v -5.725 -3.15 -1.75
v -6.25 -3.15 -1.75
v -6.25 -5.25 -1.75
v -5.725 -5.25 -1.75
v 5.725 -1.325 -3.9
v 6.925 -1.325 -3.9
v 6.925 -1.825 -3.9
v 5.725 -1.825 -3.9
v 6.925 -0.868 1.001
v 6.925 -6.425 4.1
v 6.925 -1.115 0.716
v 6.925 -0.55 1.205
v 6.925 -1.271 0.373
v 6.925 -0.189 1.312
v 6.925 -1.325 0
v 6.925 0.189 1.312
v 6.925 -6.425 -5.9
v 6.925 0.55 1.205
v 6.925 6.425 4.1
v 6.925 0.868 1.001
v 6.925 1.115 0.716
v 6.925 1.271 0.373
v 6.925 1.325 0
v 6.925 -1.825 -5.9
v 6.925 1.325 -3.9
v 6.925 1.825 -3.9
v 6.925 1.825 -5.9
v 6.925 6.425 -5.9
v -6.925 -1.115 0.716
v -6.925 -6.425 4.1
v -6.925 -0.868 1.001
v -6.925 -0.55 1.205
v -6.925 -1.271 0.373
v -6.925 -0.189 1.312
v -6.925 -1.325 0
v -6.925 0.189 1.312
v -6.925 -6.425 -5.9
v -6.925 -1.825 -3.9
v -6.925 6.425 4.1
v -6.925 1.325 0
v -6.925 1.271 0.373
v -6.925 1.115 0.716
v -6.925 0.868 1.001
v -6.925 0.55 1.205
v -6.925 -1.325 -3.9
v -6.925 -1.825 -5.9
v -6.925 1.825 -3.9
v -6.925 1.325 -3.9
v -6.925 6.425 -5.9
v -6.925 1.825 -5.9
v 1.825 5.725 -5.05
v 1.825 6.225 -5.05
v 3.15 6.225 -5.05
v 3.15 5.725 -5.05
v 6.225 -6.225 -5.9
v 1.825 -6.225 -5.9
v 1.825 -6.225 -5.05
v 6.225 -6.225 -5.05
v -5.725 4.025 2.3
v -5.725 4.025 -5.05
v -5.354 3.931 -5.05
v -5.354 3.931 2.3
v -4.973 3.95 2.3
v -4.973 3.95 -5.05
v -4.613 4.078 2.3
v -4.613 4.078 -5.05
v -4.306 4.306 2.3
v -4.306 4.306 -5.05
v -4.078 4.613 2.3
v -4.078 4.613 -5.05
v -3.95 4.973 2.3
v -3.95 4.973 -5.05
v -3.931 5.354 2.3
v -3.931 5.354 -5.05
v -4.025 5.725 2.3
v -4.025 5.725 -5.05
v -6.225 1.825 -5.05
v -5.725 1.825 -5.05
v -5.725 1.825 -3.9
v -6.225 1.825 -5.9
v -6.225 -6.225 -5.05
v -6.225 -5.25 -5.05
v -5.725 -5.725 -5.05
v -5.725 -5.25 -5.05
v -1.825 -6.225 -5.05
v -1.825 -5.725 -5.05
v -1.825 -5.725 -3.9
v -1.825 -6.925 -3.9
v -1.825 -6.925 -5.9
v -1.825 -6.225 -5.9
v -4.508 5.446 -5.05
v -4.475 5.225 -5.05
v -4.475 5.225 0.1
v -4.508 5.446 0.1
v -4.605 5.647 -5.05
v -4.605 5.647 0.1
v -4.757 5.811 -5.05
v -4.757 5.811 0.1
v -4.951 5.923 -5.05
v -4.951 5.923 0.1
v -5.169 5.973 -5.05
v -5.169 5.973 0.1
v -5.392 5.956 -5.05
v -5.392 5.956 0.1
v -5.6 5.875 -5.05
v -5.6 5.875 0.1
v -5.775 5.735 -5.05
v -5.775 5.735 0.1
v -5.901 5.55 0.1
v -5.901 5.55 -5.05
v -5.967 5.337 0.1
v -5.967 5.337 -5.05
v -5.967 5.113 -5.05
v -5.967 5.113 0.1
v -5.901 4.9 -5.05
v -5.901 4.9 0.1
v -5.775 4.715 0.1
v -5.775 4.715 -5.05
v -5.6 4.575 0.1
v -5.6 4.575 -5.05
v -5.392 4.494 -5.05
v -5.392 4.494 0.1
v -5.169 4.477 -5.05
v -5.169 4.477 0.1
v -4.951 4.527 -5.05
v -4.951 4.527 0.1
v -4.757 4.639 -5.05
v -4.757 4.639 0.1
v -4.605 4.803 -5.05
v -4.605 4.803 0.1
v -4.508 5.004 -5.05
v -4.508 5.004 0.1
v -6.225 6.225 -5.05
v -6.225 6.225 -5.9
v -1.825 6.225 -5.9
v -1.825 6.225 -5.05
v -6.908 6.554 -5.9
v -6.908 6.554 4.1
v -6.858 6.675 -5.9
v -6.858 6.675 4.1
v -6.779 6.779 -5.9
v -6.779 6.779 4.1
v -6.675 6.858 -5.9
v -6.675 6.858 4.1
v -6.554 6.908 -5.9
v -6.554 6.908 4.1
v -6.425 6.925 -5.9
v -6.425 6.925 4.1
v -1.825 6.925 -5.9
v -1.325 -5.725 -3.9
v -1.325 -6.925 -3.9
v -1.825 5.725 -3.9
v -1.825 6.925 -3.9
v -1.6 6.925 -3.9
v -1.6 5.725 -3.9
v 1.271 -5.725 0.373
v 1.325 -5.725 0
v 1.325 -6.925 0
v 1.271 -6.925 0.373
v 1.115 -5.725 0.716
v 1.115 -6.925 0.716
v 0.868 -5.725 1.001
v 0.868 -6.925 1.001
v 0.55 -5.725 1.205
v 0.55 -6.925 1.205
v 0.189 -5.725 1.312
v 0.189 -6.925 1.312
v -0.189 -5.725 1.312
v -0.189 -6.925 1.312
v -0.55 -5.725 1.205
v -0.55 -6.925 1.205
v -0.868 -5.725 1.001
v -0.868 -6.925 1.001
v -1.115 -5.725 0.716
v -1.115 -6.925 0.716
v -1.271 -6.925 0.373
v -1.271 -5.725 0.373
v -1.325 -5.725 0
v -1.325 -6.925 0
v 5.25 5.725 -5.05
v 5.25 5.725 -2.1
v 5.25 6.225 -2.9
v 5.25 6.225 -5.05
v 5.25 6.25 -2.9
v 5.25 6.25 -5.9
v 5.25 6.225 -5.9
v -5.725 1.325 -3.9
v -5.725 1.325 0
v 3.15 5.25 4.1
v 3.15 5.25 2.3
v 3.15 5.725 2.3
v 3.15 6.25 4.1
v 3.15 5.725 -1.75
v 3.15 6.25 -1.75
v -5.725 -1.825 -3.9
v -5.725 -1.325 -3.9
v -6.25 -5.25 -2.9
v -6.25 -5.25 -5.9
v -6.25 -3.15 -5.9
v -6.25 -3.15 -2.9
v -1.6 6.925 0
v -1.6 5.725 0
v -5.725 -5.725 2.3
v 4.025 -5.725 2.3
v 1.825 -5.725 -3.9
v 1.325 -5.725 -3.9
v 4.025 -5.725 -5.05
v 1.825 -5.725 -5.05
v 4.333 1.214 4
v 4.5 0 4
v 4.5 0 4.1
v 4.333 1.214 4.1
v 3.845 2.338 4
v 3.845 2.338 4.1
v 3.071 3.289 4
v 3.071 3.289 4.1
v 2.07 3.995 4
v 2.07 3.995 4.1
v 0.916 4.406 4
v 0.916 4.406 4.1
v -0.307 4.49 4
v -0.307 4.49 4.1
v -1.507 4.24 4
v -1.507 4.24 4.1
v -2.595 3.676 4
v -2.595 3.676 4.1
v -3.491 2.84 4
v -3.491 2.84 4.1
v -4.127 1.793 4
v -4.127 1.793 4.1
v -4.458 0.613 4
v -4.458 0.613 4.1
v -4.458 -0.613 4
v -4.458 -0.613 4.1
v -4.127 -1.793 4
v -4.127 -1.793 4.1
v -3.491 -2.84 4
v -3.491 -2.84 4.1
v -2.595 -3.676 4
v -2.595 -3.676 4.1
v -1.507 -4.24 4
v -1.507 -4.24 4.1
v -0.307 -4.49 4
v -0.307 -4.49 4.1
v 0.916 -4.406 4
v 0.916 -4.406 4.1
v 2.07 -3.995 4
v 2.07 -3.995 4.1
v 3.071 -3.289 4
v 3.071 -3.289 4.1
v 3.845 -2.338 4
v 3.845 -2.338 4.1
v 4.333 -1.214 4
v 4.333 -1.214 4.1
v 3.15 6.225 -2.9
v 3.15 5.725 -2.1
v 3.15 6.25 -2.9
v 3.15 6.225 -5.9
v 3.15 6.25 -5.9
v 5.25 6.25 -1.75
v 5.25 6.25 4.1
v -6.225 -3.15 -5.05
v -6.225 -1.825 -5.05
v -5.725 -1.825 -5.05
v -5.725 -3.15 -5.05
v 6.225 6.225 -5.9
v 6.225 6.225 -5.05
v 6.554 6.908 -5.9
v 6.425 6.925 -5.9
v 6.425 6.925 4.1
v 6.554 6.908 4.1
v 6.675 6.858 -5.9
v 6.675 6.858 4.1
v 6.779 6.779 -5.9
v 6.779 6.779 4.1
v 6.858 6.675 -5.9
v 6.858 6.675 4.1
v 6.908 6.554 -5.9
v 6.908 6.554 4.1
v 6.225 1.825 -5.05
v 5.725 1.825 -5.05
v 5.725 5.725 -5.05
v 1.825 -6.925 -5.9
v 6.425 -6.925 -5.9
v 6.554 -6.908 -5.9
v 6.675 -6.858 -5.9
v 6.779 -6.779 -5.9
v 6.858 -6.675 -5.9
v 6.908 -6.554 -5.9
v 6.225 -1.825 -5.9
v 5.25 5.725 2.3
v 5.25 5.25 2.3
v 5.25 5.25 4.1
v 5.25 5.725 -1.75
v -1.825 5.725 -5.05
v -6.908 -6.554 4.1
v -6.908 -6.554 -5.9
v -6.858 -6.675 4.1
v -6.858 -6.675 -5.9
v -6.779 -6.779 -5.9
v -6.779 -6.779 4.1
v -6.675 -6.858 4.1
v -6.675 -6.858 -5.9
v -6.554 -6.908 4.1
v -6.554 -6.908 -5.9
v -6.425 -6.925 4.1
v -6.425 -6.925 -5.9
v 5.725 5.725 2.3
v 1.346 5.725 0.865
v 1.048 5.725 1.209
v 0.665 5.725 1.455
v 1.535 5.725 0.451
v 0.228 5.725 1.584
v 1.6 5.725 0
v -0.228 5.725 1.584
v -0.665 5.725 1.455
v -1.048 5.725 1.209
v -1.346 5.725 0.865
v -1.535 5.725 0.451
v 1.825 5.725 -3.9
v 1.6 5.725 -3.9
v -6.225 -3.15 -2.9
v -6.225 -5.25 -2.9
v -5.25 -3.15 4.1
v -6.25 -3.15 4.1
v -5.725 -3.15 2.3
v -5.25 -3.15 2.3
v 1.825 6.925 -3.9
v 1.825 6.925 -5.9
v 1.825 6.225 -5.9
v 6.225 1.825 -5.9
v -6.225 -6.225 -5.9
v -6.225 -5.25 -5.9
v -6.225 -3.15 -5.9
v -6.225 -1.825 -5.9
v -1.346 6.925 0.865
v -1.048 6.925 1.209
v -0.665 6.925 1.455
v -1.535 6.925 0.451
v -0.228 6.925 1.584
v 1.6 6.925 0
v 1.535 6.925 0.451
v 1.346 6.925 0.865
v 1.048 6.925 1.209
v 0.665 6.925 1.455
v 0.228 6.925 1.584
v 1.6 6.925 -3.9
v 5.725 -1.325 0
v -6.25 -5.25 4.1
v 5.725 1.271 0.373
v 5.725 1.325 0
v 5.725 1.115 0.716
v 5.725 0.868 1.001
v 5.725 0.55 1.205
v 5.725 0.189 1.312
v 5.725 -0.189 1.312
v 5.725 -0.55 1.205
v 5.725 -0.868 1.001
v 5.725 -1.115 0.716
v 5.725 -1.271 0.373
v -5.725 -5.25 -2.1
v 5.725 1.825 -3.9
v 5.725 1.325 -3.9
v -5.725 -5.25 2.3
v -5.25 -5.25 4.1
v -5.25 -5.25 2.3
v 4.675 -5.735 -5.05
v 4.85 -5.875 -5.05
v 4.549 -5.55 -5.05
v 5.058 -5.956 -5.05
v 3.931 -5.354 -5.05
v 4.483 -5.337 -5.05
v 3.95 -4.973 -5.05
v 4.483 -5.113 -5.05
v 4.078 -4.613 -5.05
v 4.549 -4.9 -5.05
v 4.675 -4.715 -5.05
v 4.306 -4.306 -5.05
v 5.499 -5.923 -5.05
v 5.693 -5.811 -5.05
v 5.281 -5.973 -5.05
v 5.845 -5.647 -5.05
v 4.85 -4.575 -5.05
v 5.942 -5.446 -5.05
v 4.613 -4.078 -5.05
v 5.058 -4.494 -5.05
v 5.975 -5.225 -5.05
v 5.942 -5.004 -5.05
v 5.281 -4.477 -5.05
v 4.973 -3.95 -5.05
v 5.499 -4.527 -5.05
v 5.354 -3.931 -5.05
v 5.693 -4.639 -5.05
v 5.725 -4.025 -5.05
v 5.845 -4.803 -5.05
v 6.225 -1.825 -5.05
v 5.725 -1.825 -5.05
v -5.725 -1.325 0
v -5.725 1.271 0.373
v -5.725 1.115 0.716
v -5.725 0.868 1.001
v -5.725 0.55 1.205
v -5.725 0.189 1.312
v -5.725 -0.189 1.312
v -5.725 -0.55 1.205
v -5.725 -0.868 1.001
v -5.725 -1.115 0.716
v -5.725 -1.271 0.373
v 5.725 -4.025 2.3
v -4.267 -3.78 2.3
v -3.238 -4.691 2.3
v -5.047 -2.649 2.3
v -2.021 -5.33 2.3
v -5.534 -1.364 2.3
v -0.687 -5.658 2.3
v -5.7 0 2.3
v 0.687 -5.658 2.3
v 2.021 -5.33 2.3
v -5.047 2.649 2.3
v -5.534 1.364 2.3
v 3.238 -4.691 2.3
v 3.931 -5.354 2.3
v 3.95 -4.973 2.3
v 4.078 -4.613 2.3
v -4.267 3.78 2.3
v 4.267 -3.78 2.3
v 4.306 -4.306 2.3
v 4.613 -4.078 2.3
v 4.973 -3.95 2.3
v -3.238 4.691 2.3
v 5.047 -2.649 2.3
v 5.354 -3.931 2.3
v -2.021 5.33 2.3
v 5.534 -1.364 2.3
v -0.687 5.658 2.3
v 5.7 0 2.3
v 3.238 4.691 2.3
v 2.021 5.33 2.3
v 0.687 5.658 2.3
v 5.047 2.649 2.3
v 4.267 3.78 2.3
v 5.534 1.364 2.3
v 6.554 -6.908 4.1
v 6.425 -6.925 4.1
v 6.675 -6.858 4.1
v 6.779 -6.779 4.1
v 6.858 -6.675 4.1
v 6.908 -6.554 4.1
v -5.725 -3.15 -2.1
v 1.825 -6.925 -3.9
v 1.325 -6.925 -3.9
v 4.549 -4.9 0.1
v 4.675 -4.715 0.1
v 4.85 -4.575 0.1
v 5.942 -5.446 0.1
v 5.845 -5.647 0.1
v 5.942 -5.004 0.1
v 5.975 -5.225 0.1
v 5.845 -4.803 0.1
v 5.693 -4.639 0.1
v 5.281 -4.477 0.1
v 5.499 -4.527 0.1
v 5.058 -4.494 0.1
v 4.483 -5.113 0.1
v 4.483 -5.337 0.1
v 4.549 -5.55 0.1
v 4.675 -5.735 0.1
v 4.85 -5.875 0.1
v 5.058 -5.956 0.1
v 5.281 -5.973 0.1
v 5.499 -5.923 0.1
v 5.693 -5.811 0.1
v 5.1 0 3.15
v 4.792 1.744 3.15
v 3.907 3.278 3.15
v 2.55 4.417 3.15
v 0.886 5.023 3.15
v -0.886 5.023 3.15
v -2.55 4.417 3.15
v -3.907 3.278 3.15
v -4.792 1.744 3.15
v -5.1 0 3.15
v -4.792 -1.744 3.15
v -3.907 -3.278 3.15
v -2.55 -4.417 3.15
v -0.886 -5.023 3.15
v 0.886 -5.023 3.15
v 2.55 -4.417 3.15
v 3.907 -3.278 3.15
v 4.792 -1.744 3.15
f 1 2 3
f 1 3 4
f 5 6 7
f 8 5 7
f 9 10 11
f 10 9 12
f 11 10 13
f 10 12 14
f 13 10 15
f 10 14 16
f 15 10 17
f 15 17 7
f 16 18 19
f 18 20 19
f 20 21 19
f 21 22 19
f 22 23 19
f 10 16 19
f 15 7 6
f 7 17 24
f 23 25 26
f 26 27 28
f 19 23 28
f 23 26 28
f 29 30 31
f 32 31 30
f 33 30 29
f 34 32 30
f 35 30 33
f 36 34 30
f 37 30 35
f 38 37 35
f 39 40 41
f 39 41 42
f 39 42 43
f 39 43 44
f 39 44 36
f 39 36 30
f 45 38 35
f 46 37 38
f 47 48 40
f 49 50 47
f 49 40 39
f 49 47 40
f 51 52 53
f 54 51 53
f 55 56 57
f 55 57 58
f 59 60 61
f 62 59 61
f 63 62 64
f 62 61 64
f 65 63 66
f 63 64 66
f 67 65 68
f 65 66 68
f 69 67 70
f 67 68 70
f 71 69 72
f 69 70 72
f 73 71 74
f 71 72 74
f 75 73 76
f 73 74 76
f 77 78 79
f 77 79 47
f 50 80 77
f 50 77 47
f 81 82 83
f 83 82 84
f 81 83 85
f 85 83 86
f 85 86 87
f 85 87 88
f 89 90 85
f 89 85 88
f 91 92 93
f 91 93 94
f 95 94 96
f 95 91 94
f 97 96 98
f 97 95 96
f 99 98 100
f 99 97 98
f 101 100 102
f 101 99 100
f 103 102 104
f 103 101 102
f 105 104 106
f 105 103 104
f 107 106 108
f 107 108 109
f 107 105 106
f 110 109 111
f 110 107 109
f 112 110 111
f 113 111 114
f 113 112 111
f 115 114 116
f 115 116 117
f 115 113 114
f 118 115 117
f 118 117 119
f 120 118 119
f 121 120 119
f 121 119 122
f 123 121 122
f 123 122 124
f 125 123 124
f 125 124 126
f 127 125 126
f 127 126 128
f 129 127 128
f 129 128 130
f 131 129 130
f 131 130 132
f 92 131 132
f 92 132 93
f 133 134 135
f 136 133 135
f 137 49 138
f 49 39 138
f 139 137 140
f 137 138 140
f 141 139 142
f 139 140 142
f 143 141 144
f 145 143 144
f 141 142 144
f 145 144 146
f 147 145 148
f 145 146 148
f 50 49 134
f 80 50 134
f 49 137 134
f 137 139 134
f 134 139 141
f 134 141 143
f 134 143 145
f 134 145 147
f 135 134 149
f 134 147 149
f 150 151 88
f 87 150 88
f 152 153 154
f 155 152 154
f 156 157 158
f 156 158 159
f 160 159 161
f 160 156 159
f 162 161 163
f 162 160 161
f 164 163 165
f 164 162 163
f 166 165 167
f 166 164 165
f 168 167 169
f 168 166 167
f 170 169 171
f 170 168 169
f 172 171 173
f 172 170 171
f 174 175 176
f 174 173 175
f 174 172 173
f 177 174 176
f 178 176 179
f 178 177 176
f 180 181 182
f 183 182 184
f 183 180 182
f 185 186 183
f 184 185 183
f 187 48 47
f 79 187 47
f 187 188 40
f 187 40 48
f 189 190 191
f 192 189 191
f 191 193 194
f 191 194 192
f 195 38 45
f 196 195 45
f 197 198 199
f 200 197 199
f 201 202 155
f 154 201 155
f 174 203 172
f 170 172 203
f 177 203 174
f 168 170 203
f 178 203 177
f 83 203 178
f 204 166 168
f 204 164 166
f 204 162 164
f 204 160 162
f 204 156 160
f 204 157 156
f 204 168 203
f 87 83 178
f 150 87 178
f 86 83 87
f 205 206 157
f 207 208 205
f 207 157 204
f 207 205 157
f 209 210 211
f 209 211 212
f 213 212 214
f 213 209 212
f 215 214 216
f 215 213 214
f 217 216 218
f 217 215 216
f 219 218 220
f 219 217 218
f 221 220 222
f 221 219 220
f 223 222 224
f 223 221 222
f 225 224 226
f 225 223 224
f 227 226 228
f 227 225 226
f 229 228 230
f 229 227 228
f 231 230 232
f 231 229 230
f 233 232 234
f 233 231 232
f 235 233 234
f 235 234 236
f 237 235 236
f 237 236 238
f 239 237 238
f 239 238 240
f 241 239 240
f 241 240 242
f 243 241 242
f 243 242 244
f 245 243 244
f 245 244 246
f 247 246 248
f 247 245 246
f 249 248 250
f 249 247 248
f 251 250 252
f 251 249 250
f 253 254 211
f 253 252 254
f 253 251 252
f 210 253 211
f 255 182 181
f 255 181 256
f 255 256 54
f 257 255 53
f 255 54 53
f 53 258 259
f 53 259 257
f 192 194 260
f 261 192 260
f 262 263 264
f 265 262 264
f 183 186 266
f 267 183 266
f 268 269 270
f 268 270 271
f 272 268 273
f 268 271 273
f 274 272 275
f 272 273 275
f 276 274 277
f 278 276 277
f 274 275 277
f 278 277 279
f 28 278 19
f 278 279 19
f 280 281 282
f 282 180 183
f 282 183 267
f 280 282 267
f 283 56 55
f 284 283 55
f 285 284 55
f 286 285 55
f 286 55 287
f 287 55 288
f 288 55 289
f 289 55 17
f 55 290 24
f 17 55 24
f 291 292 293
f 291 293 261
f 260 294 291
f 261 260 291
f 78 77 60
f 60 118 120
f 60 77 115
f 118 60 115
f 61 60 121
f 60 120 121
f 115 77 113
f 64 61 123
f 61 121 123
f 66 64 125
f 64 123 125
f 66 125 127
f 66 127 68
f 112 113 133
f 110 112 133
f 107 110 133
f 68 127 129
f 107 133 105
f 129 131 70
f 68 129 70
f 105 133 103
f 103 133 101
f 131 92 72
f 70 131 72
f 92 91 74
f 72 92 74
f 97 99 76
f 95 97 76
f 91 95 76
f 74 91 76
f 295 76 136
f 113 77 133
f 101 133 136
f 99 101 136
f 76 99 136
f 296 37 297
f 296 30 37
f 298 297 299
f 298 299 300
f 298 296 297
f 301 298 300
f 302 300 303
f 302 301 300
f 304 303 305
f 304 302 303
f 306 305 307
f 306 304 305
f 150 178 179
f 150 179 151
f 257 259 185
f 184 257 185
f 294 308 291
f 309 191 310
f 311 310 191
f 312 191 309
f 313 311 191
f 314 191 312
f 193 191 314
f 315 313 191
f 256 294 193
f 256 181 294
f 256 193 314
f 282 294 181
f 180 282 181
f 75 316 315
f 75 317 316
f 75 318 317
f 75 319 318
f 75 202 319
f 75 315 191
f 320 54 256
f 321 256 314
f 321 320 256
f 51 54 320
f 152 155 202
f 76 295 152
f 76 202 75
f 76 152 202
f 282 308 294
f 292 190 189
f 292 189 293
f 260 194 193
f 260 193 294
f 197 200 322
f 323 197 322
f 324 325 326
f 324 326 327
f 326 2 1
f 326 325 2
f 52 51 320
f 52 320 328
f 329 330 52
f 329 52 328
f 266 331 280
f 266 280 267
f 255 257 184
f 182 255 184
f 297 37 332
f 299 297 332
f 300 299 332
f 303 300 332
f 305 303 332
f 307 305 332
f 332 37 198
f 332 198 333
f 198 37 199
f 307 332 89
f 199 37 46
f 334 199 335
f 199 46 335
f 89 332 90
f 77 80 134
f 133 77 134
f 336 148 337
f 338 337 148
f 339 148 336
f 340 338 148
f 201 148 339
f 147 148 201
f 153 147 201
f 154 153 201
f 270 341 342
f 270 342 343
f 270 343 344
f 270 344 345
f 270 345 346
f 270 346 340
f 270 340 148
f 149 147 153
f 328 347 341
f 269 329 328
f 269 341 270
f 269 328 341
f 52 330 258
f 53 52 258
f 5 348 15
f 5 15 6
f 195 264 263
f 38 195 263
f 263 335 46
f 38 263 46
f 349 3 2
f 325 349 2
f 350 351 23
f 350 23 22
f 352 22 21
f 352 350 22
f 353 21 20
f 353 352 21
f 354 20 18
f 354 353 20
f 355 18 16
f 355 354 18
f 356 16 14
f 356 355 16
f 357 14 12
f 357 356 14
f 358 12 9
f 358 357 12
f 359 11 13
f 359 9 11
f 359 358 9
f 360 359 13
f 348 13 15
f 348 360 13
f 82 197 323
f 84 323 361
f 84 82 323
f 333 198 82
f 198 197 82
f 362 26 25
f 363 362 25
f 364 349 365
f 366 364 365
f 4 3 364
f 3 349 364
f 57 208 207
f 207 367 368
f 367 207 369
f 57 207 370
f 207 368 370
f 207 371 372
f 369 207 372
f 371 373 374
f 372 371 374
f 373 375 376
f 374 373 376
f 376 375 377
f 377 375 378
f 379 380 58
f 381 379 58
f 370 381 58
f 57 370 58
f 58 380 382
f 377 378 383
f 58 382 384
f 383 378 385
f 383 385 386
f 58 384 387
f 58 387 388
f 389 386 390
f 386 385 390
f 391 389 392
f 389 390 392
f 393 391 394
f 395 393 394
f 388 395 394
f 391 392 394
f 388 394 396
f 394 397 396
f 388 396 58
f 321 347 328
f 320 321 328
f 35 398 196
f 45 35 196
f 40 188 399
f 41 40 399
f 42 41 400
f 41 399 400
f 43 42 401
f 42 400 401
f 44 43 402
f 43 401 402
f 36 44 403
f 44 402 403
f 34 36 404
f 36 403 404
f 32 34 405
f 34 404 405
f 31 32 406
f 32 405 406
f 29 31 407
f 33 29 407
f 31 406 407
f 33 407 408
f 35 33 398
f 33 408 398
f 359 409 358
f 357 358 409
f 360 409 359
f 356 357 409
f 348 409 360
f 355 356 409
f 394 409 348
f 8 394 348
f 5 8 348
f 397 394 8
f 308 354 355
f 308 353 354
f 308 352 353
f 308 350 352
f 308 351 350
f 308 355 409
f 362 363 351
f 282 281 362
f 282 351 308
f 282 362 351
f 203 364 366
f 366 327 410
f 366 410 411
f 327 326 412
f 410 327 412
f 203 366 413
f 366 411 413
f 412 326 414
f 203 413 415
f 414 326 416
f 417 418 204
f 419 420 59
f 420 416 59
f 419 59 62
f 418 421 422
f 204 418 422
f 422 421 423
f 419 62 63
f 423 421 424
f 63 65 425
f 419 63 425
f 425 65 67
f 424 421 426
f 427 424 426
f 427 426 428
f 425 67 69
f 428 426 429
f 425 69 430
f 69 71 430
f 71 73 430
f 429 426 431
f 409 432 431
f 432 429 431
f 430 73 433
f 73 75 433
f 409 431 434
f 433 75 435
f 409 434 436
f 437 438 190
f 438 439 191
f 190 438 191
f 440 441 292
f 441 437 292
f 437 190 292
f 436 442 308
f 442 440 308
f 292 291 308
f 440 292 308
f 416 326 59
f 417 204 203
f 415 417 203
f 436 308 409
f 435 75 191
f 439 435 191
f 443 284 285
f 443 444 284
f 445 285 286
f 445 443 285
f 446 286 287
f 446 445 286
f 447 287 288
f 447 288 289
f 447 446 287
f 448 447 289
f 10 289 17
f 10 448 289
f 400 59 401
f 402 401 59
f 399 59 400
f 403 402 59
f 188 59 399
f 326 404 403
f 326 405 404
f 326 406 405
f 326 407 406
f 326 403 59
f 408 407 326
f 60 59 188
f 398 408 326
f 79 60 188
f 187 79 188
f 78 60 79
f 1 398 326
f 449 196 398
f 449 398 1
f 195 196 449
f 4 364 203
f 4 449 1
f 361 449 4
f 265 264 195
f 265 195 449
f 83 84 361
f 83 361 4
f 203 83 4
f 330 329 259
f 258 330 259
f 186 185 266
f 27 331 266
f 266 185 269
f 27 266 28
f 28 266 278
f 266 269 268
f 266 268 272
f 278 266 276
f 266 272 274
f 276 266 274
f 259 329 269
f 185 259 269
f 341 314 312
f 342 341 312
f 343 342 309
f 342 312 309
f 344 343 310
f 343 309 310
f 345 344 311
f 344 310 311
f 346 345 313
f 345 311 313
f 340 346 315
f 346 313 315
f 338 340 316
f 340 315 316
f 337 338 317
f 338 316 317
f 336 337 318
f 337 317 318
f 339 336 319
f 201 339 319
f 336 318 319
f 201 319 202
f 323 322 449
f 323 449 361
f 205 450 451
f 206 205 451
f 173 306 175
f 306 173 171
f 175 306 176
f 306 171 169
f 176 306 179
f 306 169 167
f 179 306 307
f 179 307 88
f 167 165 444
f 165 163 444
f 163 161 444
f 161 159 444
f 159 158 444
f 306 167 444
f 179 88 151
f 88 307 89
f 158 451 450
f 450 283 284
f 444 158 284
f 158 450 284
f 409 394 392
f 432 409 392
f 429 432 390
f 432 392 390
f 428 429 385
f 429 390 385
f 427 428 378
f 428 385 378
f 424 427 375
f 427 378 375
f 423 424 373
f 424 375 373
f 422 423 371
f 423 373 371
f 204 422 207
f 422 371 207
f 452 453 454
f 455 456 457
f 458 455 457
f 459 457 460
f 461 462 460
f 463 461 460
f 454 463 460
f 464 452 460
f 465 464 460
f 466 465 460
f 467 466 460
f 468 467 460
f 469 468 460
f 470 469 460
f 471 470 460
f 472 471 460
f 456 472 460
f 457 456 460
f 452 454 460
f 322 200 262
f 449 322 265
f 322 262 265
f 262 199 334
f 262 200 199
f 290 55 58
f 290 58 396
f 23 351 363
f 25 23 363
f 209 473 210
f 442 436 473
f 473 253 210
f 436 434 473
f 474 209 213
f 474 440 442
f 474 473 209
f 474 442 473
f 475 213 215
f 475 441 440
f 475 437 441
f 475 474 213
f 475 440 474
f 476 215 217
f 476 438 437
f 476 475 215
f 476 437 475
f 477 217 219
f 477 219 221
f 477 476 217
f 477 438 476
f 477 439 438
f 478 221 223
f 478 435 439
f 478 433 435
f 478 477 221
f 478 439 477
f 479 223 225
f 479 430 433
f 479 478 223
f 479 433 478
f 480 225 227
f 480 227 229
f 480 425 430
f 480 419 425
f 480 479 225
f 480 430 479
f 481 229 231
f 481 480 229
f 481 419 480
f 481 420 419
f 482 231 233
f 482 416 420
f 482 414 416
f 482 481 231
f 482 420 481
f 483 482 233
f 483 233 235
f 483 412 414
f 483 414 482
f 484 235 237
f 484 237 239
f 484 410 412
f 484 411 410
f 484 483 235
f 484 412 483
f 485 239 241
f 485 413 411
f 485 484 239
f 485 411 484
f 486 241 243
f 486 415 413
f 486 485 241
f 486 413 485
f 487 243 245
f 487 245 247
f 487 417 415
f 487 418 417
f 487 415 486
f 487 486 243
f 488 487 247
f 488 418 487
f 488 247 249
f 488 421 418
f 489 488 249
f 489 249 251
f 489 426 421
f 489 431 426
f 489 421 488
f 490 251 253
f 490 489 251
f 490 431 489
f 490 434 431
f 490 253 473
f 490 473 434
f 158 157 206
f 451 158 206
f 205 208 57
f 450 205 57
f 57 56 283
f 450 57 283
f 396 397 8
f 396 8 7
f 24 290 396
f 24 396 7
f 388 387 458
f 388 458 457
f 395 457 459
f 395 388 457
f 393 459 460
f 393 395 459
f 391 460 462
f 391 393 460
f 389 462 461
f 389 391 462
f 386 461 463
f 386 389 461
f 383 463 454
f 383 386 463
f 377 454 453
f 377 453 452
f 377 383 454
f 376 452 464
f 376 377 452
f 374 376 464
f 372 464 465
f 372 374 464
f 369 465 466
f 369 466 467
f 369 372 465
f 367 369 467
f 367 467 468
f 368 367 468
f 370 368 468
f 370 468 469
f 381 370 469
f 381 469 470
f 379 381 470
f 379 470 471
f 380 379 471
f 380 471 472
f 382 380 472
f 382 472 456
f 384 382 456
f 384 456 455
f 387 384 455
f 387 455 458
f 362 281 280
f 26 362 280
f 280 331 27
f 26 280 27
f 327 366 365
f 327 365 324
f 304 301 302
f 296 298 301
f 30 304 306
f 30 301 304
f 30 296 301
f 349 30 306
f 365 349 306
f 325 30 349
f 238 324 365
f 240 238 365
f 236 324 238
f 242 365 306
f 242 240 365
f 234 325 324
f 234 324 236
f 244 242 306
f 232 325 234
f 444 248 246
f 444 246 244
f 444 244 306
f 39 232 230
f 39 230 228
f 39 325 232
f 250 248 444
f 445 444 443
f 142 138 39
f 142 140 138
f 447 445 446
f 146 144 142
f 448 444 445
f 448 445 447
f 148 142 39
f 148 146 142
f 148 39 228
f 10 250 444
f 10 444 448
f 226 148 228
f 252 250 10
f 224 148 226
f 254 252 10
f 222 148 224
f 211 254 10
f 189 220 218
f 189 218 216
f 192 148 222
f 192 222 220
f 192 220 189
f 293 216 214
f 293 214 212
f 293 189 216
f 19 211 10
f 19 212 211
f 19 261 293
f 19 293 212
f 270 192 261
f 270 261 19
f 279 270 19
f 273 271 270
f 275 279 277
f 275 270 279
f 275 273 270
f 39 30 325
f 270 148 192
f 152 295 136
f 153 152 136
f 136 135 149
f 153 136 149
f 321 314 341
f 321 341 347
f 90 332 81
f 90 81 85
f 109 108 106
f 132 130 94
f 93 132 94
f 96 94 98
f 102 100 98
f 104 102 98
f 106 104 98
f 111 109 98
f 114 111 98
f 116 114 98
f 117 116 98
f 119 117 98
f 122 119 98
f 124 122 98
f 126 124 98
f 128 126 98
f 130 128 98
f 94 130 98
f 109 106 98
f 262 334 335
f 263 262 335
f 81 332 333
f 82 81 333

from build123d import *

# Parameters (mm, degrees)
SKETCH042_W           = 13.85
SKETCH042_H           = 13.85
PAD020_DEPTH          = 10
POCKET016_DEPTH       = 8.2
SKETCH054_R           = 4.5
POCKET025_DEPTH       = 0.001
POCKET025_DEPTH_BACK  = 10.001
SKETCH044_W           = 12.45
SKETCH044_H           = 12.45
POCKET017_DEPTH       = 0.85
SKETCH045_W           = 3.65
SKETCH045_H           = 2
POCKET018_DEPTH       = 2
POLARPATTERN004_COUNT = 4
POCKET019_DEPTH       = 6.926
POCKET020_DEPTH       = 6.926
POCKET021_DEPTH       = 6.926
POCKET022_DEPTH       = 6.926
SKETCH050_R           = 0.75
HOLE_DEPTH            = 6
SKETCH052_W           = 2
SKETCH052_H           = 2.1
SKETCH052_W_2         = 2.1
SKETCH052_H_2         = 2
POCKET023_DEPTH       = 3
SKETCH053_W           = 1
SKETCH053_H           = 2.1
SKETCH053_W_2         = 2.1
SKETCH053_H_2         = 1
POCKET024_DEPTH       = 5.851
FILLET_R              = 0.5
CHAMFER001_1_SIZE2    = 0.5
CHAMFER001_1_SIZE     = 0.8
CHAMFER001_2_SIZE2    = 0.5
CHAMFER001_2_SIZE     = 0.8


with BuildPart() as part:
    # Sketch042 → Pad020 (new body)
    with BuildSketch(Plane.XY):
        Rectangle(SKETCH042_W, SKETCH042_H)
    extrude(amount=PAD020_DEPTH)

    # Sketch043 → Pocket016 (cut)
    with BuildSketch(Plane.XY):
        with BuildLine():
            Line((-5.725, 4.025), (-5.725, -5.725))
            Line((-5.725, -5.725), (4.025, -5.725))
            ThreePointArc((5.725, -4.025), (4.305761, -4.305761), (4.025, -5.725))
            Line((5.725, -4.025), (5.725, 5.725))
            Line((5.725, 5.725), (-4.025, 5.725))
            ThreePointArc((-5.725, 4.025), (-4.305761, 4.305761), (-4.025, 5.725))
        make_face()
    extrude(amount=POCKET016_DEPTH, mode=Mode.SUBTRACT)

    # Sketch054 → Pocket025 (cut, two sides)
    with BuildSketch(Plane.XY) as pocket025_sk:
        Circle(SKETCH054_R)
    extrude(amount=-POCKET025_DEPTH, mode=Mode.SUBTRACT)
    extrude(pocket025_sk.sketch, amount=POCKET025_DEPTH_BACK, mode=Mode.SUBTRACT)

    # Sketch055 → Groove003 (revolve, cut)
    with BuildSketch(Plane.XZ):
        Polygon((4.5, 9.9), (5.7, 8.2), (4.5, 8.2), align=None)
    revolve(axis=Axis((0, 0, 0), (0, 0, 1)), mode=Mode.SUBTRACT)

    # Sketch044 → Pocket017 (cut)
    with BuildSketch(Plane.XY):
        Rectangle(SKETCH044_W, SKETCH044_H)
    extrude(amount=POCKET017_DEPTH, mode=Mode.SUBTRACT)

    # Sketch045 → Pocket018 (cut)
    with BuildSketch(Plane.XY):
        with Locations((0, 5.925)):
            Rectangle(SKETCH045_W, SKETCH045_H)
    pocket018 = extrude(amount=POCKET018_DEPTH, mode=Mode.SUBTRACT)

    # PolarPattern004: Pocket018 ×4 about axis
    polarpattern004_axis = Axis((0, 0, 0), (0, 0, 1))
    for i in range(1, POLARPATTERN004_COUNT):
        add(pocket018.rotate(polarpattern004_axis, i * 360 / POLARPATTERN004_COUNT), mode=Mode.SUBTRACT)

    # Sketch046 → Pocket019 (cut, through all)
    with BuildSketch(Plane.XZ):
        with BuildLine():
            ThreePointArc((1.6, 5.9), (0, 7.5), (-1.6, 5.9))
            Line((-1.6, 5.9), (-1.6, 1.9))
            Line((-1.6, 1.9), (-1.825, 1.9))
            Line((-1.825, 1.9), (-1.825, -0.1))
            Line((1.825, -0.1), (-1.825, -0.1))
            Line((1.825, 1.9), (1.825, -0.1))
            Line((1.6, 1.9), (1.825, 1.9))
            Line((1.6, 5.9), (1.6, 1.9))
        make_face()
    extrude(amount=-POCKET019_DEPTH, mode=Mode.SUBTRACT)

    # Sketch047 → Pocket020 (cut, through all)
    with BuildSketch(Plane.XZ):
        with BuildLine():
            ThreePointArc((1.325, 5.9), (0, 7.225), (-1.325, 5.9))
            Line((-1.325, 5.9), (-1.325, 1.9))
            Line((-1.325, 1.9), (-1.825, 1.9))
            Line((-1.825, 1.9), (-1.825, -0.1))
            Line((1.825, -0.1), (-1.825, -0.1))
            Line((1.825, 1.9), (1.825, -0.1))
            Line((1.325, 1.9), (1.825, 1.9))
            Line((1.325, 5.9), (1.325, 1.9))
        make_face()
    extrude(amount=POCKET020_DEPTH, mode=Mode.SUBTRACT)

    # Sketch048 → Pocket021 (cut, through all)
    with BuildSketch(Plane.YZ):
        with BuildLine():
            ThreePointArc((1.325, 5.9), (0, 7.225), (-1.325, 5.9))
            Line((-1.325, 5.9), (-1.325, 1.9))
            Line((-1.325, 1.9), (-1.825, 1.9))
            Line((-1.825, 1.9), (-1.825, -0.1))
            Line((1.825, -0.1), (-1.825, -0.1))
            Line((1.825, 1.9), (1.825, -0.1))
            Line((1.325, 1.9), (1.825, 1.9))
            Line((1.325, 5.9), (1.325, 1.9))
        make_face()
    extrude(amount=POCKET021_DEPTH, mode=Mode.SUBTRACT)

    # Sketch049 → Pocket022 (cut, through all)
    with BuildSketch(Plane.YZ):
        with BuildLine():
            ThreePointArc((1.325, 5.9), (0, 7.225), (-1.325, 5.9))
            Line((-1.325, 5.9), (-1.325, 2))
            Line((-1.325, 2), (-1.825, 2))
            Line((-1.825, 2), (-1.825, 0))
            Line((1.825, 0), (-1.825, 0))
            Line((1.825, 2), (1.825, 0))
            Line((1.325, 2), (1.825, 2))
            Line((1.325, 5.9), (1.325, 2))
        make_face()
    extrude(amount=-POCKET022_DEPTH, mode=Mode.SUBTRACT)

    # Sketch050 → Hole (cut)
    with BuildSketch(Plane.XY):
        with Locations((-5.225, 5.225)):
            Circle(SKETCH050_R)
        with Locations((5.225, -5.225)):
            Circle(SKETCH050_R)
    extrude(amount=HOLE_DEPTH, mode=Mode.SUBTRACT)

    # Sketch052 → Pocket023 (cut)
    with BuildSketch(Plane.XY):
        with Locations((-5.25, -4.2)):
            Rectangle(SKETCH052_W, SKETCH052_H)
        with Locations((4.2, 5.25)):
            Rectangle(SKETCH052_W_2, SKETCH052_H_2)
    extrude(amount=POCKET023_DEPTH, mode=Mode.SUBTRACT)

    # Sketch053 → Pocket024 (cut, through all)
    with BuildSketch(Plane.XY.offset(4.15)):
        with Locations((-5.75, -4.2)):
            Rectangle(SKETCH053_W, SKETCH053_H)
        with Locations((4.2, 5.75)):
            Rectangle(SKETCH053_W_2, SKETCH053_H_2)
    extrude(amount=POCKET024_DEPTH, mode=Mode.SUBTRACT)

    # Fillet
    fillet_edges = [part.edges().sort_by_distance(p)[0] for p in [
        (-6.925, 6.925, 5),
        (-6.925, -6.925, 5),
        (6.925, -6.925, 5),
        (6.925, 6.925, 5),
    ]]
    fillet(fillet_edges, radius=FILLET_R)

    # Chamfer001 1
    chamfer001_1_edges = [part.edges().sort_by_distance(p)[0] for p in [
        (-5.725, -4.2, 3),
    ]]
    chamfer001_1_side = part.faces().sort_by_distance((-5.725, 2.925, 0.9721))[0]
    chamfer(chamfer001_1_edges, length=CHAMFER001_1_SIZE, length2=CHAMFER001_1_SIZE2, reference=chamfer001_1_side)

    # Chamfer001 2
    chamfer001_2_edges = [part.edges().sort_by_distance(p)[0] for p in [
        (4.2, 5.725, 3),
    ]]
    chamfer001_2_side = part.faces().sort_by_distance((5.4875, 5.725, 0.9721))[0]
    chamfer(chamfer001_2_edges, length=CHAMFER001_2_SIZE, length2=CHAMFER001_2_SIZE2, reference=chamfer001_2_side)


with BuildPart() as part_1:
    # Body005 placement: moved
    add(part.part.moved(Location((0, 0, -5.9))))


solid = part_1.part
